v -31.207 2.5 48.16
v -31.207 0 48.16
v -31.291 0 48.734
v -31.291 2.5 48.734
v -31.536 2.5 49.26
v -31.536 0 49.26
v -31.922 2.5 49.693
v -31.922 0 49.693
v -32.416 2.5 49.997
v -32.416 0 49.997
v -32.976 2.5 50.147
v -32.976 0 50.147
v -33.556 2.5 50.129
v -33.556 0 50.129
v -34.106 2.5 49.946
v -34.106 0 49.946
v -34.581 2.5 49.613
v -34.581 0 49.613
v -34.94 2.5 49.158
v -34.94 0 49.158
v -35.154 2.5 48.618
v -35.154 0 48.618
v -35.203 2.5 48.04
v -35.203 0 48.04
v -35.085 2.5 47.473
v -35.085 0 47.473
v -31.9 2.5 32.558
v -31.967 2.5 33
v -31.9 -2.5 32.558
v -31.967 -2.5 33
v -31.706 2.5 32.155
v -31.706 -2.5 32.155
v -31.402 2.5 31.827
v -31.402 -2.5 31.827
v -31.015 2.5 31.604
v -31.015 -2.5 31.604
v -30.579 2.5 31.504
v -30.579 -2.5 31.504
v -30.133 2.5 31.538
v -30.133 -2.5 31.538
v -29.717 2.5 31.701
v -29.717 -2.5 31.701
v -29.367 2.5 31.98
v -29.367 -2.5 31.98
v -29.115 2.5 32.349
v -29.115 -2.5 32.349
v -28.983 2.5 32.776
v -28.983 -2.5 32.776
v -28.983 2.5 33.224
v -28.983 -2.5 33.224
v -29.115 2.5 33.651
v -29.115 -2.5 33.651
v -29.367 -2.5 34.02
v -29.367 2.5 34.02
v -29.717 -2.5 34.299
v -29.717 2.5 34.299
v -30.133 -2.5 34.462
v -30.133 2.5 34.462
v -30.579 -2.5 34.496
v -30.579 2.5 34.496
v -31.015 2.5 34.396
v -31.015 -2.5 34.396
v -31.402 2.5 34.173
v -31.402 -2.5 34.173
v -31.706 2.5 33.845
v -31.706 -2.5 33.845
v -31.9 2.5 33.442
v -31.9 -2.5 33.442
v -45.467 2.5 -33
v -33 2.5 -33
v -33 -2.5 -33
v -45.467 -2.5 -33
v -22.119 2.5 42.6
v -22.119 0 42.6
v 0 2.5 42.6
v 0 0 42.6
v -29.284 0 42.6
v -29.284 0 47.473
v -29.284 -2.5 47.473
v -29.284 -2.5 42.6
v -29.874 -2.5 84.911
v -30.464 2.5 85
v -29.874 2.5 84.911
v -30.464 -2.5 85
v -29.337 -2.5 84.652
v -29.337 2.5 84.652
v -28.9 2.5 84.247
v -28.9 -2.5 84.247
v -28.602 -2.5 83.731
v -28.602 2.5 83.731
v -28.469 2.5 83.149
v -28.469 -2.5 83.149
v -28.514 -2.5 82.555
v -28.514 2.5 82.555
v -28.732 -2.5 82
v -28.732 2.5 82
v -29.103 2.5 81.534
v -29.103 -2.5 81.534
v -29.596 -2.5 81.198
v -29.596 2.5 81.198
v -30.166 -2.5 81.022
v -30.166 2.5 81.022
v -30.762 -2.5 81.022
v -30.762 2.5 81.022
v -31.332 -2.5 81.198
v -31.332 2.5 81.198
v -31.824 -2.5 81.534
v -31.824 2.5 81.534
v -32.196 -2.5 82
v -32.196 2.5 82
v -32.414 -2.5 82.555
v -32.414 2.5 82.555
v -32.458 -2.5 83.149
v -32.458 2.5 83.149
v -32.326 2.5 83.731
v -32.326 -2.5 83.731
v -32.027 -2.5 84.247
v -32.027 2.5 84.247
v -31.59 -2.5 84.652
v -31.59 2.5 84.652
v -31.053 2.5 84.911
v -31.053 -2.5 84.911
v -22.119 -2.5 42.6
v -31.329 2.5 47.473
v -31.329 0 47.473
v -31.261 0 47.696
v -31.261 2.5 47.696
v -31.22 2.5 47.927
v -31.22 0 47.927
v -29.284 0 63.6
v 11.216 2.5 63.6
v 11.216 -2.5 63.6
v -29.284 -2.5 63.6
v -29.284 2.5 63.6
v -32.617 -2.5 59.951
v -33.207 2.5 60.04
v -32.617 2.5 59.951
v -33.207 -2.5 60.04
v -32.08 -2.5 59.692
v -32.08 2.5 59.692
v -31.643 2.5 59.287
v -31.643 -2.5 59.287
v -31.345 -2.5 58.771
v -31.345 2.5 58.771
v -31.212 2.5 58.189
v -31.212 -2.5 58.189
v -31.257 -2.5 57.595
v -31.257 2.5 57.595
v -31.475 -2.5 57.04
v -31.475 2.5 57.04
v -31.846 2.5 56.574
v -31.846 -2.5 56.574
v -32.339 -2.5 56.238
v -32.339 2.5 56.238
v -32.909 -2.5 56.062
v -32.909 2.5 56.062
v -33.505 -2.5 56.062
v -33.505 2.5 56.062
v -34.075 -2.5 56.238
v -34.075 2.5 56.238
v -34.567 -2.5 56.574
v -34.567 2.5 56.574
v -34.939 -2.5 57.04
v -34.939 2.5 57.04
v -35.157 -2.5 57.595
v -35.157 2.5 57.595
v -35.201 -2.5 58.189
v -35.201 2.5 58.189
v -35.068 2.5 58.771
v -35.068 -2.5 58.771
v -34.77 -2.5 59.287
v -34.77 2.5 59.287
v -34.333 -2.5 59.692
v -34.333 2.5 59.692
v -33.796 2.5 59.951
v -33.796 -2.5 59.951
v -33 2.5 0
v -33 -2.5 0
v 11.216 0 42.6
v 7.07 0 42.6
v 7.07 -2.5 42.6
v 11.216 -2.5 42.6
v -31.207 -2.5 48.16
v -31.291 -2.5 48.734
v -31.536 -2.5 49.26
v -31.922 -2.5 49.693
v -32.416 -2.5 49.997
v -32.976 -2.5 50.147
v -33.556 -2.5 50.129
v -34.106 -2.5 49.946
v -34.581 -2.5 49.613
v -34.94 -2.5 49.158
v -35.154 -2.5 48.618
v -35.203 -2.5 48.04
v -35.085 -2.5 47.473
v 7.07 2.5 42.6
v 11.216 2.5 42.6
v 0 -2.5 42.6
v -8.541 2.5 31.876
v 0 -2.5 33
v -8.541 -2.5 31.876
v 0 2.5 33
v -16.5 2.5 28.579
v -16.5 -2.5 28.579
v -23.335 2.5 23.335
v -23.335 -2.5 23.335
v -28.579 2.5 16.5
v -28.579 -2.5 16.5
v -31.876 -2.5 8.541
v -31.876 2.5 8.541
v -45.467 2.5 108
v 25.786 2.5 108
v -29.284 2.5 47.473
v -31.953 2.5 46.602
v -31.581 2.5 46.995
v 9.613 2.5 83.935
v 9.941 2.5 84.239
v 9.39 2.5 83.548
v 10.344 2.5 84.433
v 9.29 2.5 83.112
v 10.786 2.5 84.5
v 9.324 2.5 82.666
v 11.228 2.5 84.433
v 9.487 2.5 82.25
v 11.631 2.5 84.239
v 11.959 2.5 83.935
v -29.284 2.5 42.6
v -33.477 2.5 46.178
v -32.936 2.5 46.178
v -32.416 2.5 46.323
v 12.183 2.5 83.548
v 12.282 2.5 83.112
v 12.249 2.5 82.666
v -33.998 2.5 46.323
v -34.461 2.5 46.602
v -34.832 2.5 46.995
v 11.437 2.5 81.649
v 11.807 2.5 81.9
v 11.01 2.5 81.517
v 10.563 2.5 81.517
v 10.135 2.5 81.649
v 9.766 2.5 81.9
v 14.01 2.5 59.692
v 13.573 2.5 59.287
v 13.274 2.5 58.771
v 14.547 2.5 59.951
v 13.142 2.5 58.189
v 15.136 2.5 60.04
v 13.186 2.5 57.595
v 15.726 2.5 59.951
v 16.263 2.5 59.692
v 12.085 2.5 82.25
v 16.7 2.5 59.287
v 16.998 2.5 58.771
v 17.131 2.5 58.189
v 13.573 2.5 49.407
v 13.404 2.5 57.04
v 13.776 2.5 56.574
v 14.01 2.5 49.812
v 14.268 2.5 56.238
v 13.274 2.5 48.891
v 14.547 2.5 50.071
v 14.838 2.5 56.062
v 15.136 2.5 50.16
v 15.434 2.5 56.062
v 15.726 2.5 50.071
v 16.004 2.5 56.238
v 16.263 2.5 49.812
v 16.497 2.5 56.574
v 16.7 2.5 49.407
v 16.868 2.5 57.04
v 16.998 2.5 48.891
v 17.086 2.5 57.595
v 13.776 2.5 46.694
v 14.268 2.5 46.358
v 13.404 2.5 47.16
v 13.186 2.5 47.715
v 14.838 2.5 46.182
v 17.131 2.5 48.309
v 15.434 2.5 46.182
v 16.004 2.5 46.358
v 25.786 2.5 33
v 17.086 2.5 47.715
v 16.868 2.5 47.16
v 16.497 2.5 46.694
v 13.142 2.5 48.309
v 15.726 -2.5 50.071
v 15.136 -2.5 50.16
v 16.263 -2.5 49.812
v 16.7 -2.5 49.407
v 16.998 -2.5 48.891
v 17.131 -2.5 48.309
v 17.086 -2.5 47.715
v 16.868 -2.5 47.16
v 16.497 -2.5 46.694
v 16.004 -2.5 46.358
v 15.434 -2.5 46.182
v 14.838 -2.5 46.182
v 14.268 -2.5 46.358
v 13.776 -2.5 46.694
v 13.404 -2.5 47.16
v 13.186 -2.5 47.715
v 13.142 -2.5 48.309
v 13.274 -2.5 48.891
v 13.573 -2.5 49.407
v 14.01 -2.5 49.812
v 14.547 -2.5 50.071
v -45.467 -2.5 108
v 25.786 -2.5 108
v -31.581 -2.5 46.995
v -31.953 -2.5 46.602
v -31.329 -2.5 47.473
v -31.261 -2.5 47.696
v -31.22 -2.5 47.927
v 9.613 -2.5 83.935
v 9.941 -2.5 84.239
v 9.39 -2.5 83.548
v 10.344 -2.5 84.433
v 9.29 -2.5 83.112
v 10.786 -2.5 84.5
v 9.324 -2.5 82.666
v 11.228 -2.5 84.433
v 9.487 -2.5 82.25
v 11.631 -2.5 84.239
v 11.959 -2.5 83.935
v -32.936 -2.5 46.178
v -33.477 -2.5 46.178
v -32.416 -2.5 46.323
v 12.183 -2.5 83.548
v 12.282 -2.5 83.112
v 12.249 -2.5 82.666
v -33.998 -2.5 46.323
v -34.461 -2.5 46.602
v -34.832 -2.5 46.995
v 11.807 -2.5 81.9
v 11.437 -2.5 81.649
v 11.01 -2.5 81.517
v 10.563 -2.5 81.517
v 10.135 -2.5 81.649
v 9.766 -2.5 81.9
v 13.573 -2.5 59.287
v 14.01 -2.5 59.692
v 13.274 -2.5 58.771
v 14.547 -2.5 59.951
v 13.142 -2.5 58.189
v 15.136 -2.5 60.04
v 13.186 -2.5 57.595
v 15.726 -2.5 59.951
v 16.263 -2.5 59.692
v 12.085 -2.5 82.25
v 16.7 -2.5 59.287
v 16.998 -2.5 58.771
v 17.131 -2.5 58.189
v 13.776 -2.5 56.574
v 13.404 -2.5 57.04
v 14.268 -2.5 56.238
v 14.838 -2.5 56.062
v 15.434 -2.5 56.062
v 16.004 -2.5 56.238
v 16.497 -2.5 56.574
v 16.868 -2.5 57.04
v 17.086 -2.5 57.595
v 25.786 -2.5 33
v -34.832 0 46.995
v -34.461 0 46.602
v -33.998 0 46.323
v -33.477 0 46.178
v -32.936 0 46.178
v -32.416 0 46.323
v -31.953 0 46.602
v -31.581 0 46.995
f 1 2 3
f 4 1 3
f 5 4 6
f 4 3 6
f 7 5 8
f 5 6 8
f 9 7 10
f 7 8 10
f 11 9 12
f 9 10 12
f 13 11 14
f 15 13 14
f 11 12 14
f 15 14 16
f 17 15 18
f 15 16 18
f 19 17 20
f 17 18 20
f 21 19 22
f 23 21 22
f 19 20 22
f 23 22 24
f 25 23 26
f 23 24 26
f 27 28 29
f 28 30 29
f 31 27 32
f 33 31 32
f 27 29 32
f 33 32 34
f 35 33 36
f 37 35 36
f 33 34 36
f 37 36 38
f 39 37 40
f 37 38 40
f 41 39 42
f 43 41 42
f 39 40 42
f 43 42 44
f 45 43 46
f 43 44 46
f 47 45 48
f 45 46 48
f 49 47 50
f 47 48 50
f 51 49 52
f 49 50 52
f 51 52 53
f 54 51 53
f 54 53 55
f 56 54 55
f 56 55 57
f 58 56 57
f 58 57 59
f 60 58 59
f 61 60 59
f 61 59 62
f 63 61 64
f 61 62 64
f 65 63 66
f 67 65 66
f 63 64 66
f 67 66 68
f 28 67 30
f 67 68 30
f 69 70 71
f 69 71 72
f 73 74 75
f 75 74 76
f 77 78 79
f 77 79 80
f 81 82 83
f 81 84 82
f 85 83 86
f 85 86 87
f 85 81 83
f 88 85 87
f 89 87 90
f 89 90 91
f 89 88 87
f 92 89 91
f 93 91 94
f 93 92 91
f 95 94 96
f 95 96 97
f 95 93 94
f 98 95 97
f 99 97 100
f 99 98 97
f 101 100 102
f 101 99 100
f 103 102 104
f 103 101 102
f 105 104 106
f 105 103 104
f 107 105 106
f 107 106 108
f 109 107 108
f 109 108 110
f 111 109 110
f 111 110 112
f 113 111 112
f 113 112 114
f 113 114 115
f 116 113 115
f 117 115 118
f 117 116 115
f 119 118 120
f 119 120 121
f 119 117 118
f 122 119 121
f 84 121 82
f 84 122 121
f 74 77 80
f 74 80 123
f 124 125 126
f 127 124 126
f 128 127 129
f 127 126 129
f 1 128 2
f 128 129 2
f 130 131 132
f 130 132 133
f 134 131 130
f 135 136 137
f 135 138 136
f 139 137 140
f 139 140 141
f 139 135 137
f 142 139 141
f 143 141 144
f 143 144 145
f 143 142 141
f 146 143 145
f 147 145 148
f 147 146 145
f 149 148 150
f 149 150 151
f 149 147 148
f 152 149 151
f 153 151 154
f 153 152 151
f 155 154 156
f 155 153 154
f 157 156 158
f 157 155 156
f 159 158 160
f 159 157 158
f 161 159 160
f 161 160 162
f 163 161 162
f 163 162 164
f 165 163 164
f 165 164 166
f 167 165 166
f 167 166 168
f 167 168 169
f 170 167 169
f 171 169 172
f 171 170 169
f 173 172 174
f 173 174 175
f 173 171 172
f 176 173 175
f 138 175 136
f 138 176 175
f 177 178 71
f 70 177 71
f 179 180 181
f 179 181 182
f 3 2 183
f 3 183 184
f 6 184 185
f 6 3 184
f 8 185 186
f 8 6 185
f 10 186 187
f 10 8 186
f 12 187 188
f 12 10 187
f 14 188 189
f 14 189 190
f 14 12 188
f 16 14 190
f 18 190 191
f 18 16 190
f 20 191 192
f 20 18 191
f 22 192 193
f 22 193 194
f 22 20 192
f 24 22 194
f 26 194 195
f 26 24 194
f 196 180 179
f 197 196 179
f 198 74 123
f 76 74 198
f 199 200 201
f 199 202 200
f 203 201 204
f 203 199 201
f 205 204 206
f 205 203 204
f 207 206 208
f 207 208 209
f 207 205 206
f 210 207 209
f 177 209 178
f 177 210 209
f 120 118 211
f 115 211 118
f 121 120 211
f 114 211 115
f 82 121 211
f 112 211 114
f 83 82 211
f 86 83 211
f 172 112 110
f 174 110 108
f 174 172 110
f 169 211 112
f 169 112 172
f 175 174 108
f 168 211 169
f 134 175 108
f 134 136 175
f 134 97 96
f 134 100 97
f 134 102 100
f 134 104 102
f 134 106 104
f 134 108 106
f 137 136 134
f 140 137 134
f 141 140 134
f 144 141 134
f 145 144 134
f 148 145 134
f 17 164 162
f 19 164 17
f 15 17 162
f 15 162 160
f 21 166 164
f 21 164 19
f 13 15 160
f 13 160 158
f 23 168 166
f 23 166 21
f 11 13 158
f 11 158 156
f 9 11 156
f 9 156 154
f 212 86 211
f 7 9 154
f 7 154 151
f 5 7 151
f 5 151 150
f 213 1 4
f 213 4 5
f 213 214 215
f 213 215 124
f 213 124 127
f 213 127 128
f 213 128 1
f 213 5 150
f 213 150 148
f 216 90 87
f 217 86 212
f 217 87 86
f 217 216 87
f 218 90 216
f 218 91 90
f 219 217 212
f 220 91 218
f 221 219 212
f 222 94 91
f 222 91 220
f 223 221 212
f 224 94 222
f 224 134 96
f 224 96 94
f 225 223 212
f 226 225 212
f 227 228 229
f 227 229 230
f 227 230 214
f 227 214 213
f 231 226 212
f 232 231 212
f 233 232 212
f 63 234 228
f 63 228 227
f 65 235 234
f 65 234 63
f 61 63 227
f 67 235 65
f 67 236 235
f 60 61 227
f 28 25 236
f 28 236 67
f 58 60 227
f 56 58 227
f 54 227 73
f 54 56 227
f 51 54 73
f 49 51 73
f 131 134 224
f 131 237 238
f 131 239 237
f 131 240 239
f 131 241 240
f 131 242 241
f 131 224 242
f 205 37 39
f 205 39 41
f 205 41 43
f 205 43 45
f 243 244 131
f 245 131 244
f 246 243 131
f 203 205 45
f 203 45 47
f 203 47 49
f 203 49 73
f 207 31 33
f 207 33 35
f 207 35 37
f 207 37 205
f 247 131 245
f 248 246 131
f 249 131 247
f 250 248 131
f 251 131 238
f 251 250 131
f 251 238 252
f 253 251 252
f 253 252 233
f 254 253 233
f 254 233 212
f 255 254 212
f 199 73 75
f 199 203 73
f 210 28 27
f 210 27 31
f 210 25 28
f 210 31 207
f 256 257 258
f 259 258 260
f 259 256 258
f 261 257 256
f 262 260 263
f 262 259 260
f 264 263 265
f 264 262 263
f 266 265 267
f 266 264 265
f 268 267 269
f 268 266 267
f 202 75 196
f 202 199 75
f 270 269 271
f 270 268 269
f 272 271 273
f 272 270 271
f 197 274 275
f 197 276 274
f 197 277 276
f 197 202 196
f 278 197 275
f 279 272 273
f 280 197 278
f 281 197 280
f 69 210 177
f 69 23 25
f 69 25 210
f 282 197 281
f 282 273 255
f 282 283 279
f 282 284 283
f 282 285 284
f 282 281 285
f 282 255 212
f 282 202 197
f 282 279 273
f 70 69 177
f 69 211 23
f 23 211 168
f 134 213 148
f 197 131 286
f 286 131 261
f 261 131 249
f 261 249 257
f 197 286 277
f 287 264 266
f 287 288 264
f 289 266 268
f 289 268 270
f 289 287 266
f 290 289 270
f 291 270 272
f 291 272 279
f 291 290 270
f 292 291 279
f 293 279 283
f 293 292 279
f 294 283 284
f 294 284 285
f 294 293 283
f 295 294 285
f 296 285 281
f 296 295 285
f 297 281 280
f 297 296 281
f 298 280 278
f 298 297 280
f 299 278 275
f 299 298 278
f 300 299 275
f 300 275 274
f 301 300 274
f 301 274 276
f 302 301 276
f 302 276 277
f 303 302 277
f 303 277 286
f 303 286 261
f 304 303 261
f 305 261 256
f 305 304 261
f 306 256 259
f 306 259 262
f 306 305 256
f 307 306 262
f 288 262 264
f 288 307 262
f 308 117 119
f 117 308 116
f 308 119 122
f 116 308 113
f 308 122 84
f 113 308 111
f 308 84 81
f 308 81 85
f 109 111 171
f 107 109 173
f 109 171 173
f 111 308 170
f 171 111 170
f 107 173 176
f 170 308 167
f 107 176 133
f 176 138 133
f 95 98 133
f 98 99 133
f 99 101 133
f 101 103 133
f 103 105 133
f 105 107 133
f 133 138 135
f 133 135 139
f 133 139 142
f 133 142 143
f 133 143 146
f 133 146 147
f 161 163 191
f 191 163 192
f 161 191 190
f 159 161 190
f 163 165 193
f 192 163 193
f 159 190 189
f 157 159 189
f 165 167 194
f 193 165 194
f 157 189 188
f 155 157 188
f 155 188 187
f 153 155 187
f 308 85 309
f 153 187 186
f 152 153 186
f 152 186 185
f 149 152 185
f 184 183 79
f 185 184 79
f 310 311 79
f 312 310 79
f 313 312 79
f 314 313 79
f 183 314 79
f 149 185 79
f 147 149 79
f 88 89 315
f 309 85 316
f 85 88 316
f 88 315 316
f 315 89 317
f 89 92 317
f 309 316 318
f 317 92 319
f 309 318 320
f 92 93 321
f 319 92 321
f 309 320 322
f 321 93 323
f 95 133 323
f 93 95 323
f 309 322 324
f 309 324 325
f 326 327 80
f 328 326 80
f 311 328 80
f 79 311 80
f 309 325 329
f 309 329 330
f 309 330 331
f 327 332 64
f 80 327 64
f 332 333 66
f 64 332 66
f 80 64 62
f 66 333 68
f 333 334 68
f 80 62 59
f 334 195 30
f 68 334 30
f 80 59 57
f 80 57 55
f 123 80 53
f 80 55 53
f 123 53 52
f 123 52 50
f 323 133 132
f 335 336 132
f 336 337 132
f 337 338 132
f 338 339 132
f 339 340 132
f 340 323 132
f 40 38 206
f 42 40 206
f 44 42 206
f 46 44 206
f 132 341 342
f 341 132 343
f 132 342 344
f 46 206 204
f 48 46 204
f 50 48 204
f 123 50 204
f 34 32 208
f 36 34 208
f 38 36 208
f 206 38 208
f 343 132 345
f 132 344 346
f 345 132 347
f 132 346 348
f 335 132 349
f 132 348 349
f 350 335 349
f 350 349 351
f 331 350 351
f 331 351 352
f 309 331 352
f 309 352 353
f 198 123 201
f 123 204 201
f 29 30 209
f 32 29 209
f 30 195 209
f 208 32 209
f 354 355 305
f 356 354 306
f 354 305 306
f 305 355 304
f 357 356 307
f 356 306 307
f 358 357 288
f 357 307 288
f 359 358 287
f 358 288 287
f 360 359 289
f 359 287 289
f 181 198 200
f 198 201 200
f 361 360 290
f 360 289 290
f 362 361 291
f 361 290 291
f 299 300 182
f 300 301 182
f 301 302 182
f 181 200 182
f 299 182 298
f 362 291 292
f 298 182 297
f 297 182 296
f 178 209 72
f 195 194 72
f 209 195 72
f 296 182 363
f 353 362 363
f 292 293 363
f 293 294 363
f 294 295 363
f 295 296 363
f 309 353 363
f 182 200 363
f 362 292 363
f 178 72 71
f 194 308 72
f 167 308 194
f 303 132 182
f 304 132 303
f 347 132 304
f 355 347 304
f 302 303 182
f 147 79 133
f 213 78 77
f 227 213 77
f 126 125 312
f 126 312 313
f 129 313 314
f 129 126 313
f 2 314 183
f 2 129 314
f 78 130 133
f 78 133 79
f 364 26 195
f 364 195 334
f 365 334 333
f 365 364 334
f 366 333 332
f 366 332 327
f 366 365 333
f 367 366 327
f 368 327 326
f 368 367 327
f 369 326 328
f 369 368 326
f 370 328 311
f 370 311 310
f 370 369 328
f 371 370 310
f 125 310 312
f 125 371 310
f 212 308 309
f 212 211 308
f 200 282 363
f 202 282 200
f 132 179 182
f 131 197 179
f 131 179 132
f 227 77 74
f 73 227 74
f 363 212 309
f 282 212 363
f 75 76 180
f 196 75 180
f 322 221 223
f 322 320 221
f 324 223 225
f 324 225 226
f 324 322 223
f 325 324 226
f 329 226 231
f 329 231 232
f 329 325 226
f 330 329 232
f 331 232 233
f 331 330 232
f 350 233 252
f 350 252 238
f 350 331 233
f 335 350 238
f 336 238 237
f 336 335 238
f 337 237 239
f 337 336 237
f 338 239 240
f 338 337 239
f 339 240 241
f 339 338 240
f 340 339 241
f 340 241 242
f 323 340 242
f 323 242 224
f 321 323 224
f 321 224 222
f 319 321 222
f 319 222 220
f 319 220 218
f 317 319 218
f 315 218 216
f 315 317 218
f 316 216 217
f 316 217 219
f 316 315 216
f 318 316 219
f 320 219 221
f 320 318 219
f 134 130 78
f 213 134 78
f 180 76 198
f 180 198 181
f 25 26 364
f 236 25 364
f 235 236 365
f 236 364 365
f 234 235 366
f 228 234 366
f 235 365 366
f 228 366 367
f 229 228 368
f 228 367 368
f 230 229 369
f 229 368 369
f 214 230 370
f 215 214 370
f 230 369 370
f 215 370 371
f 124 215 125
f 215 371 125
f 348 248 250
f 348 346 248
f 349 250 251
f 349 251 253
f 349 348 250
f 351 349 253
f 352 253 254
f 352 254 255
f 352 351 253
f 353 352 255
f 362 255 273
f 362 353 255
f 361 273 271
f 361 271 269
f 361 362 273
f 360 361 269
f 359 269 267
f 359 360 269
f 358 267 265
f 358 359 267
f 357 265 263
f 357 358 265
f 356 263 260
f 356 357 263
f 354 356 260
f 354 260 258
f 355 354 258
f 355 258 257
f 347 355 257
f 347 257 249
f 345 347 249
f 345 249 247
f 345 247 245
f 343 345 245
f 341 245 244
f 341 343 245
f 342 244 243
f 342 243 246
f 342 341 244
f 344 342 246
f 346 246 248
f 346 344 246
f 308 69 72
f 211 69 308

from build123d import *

# Parameters (mm, degrees)
SKETCH1_W           = 7.069644311
SKETCH1_H           = 9.6
SKETCH1_R           = 2
SKETCH1_R_2         = 1.5
BOSS_EXTRUDE1_DEPTH = 2.5


with BuildPart() as part:
    # Sketch1 → Boss-Extrude1 (new, symmetric)
    # profile 1 of 9: a face of its own
    with BuildSketch(Plane(origin=(0, 0, 0), x_dir=(1, 0, 0), z_dir=(0, 1, 0))):
        with BuildLine():
            ThreePointArc((-45.466733516, 15.387532074), (-41.115924877, 24.768542983), (-34.856850116, 33))
            Line((-34.856850116, 33), (-45.466733516, 33))
            Line((-45.466733516, 33), (-45.466733516, 15.387532074))
        make_face()
    # profile 2 of 9: a face of its own
    with BuildSketch(Plane(origin=(0, 0, 0), x_dir=(1, 0, 0), z_dir=(0, 1, 0))):
        with BuildLine():
            Line((-33, 33), (-34.856850116, 33))
            ThreePointArc((-34.856850116, 33), (-41.115924877, 24.768542983), (-45.466733516, 15.387532074))
            Line((-45.466733516, 15.387532074), (-45.466733516, 13.267794591))
            Line((-45.466733516, 13.267794591), (-33, 13.267794591))
            Line((-33, 13.267794591), (-33, 33))
        make_face()
    # profile 3 of 9: a face of its own
    with BuildSketch(Plane(origin=(0, 0, 0), x_dir=(1, 0, 0), z_dir=(0, 1, 0))):
        with BuildLine():
            Line((-33, 0), (-33, 13.267794591))
            Line((-33, 13.267794591), (-45.466733516, 13.267794591))
            Line((-45.466733516, 13.267794591), (-45.466733516, -15.387532074))
            ThreePointArc((-45.466733516, -15.387532074), (-41.115924877, -24.768542983), (-34.856850116, -33))
            Line((-34.856850116, -33), (-31.966733516, -33))
            ThreePointArc((-31.966733516, -33), (-30.466733516, -31.5), (-28.966733516, -33))
            Line((-28.966733516, -33), (0, -33))
            ThreePointArc((0, -33), (-23.334523779, -23.334523779), (-33, 0))
        make_face()
    # profile 4 of 9: a face of its own
    with BuildSketch(Plane(origin=(0, 0, 0), x_dir=(1, 0, 0), z_dir=(0, 1, 0))):
        with BuildLine():
            Line((-34.856850116, -33), (-45.466733516, -33))
            Line((-45.466733516, -33), (-45.466733516, -47.472549547))
            Line((-45.466733516, -47.472549547), (-35.084874053, -47.472549547))
            ThreePointArc((-35.084874053, -47.472549547), (-33.206733516, -46.16), (-31.32859298, -47.472549547))
            Line((-31.32859298, -47.472549547), (-29.283755862, -47.472549547))
            Line((-29.283755862, -47.472549547), (-29.283755862, -42.6))
            Line((-29.283755862, -42.6), (-22.118770309, -42.6))
            ThreePointArc((-22.118770309, -42.6), (-28.889363626, -38.332814523), (-34.856850116, -33))
        make_face()
    # profile 5 of 9: a face of its own
    with BuildSketch(Plane(origin=(0, 0, 0), x_dir=(1, 0, 0), z_dir=(0, 1, 0))):
        with BuildLine():
            ThreePointArc((-34.856850116, -33), (-41.115924877, -24.768542983), (-45.466733516, -15.387532074))
            Line((-45.466733516, -15.387532074), (-45.466733516, -33))
            Line((-45.466733516, -33), (-34.856850116, -33))
        make_face()
    # profile 6 of 9: a face of its own
    with BuildSketch(Plane(origin=(0, 0, 0), x_dir=(1, 0, 0), z_dir=(0, 1, 0))):
        with BuildLine():
            Line((0, -42.6), (0, -33))
            Line((0, -33), (-28.966733516, -33))
            ThreePointArc((-28.966733516, -33), (-30.466733516, -34.5), (-31.966733516, -33))
            Line((-31.966733516, -33), (-34.856850116, -33))
            ThreePointArc((-34.856850116, -33), (-28.889363626, -38.332814523), (-22.118770309, -42.6))
            Line((-22.118770309, -42.6), (0, -42.6))
        make_face()
    # profile 7 of 9: a face of its own
    with BuildSketch(Plane(origin=(0, 0, 0), x_dir=(1, 0, 0), z_dir=(0, 1, 0))):
        with Locations((3.534822156, -37.8)):
            Rectangle(SKETCH1_W, SKETCH1_H)
    # profile 8 of 9: a face of its own
    with BuildSketch(Plane(origin=(0, 0, 0), x_dir=(1, 0, 0), z_dir=(0, 1, 0))):
        with BuildLine():
            ThreePointArc((11.216244138, -46.671145984), (18.757980211, -44.183007802), (25.786244138, -40.485424701))
            Line((25.786244138, -40.485424701), (25.786244138, -33))
            Line((25.786244138, -33), (7.069644311, -33))
            Line((7.069644311, -33), (7.069644311, -42.6))
            Line((7.069644311, -42.6), (11.216244138, -42.6))
            Line((11.216244138, -42.6), (11.216244138, -46.671145984))
        make_face()
    # profile 9 of 9: a face of its own
    with BuildSketch(Plane(origin=(0, 0, 0), x_dir=(1, 0, 0), z_dir=(0, 1, 0))):
        with BuildLine():
            Line((25.786244138, -107.999697871), (25.786244138, -40.485424701))
            ThreePointArc((25.786244138, -40.485424701), (18.757980211, -44.183007802), (11.216244138, -46.671145984))
            Line((11.216244138, -46.671145984), (11.216244138, -63.6))
            Line((11.216244138, -63.6), (-29.283755862, -63.6))
            Line((-29.283755862, -63.6), (-29.283755862, -47.472549547))
            Line((-29.283755862, -47.472549547), (-31.32859298, -47.472549547))
            ThreePointArc((-31.32859298, -47.472549547), (-31.237434013, -47.810916251), (-31.206733516, -48.16))
            ThreePointArc((-31.206733516, -48.16), (-33.555817265, -50.129299504), (-35.084874053, -47.472549547))
            Line((-35.084874053, -47.472549547), (-45.466733516, -47.472549547))
            Line((-45.466733516, -47.472549547), (-45.466733516, -107.999697871))
            Line((-45.466733516, -107.999697871), (25.786244138, -107.999697871))
        make_face()
        with Locations(Location((-30.463755862, -83, 0), (0, 0, 270))):
            Circle(SKETCH1_R, mode=Mode.SUBTRACT)
        with Locations(Location((-33.206733516, -58.04, 0), (0, 0, 270))):
            Circle(SKETCH1_R, mode=Mode.SUBTRACT)
        with Locations(Location((10.786244138, -83, 0), (0, 0, 270))):
            Circle(SKETCH1_R_2, mode=Mode.SUBTRACT)
        with Locations(Location((15.136244138, -58.04, 0), (0, 0, 270))):
            Circle(SKETCH1_R, mode=Mode.SUBTRACT)
        with Locations(Location((15.136244138, -48.16, 0), (0, 0, 270))):
            Circle(SKETCH1_R, mode=Mode.SUBTRACT)
    extrude(amount=BOSS_EXTRUDE1_DEPTH, both=True)


solid = part.part
